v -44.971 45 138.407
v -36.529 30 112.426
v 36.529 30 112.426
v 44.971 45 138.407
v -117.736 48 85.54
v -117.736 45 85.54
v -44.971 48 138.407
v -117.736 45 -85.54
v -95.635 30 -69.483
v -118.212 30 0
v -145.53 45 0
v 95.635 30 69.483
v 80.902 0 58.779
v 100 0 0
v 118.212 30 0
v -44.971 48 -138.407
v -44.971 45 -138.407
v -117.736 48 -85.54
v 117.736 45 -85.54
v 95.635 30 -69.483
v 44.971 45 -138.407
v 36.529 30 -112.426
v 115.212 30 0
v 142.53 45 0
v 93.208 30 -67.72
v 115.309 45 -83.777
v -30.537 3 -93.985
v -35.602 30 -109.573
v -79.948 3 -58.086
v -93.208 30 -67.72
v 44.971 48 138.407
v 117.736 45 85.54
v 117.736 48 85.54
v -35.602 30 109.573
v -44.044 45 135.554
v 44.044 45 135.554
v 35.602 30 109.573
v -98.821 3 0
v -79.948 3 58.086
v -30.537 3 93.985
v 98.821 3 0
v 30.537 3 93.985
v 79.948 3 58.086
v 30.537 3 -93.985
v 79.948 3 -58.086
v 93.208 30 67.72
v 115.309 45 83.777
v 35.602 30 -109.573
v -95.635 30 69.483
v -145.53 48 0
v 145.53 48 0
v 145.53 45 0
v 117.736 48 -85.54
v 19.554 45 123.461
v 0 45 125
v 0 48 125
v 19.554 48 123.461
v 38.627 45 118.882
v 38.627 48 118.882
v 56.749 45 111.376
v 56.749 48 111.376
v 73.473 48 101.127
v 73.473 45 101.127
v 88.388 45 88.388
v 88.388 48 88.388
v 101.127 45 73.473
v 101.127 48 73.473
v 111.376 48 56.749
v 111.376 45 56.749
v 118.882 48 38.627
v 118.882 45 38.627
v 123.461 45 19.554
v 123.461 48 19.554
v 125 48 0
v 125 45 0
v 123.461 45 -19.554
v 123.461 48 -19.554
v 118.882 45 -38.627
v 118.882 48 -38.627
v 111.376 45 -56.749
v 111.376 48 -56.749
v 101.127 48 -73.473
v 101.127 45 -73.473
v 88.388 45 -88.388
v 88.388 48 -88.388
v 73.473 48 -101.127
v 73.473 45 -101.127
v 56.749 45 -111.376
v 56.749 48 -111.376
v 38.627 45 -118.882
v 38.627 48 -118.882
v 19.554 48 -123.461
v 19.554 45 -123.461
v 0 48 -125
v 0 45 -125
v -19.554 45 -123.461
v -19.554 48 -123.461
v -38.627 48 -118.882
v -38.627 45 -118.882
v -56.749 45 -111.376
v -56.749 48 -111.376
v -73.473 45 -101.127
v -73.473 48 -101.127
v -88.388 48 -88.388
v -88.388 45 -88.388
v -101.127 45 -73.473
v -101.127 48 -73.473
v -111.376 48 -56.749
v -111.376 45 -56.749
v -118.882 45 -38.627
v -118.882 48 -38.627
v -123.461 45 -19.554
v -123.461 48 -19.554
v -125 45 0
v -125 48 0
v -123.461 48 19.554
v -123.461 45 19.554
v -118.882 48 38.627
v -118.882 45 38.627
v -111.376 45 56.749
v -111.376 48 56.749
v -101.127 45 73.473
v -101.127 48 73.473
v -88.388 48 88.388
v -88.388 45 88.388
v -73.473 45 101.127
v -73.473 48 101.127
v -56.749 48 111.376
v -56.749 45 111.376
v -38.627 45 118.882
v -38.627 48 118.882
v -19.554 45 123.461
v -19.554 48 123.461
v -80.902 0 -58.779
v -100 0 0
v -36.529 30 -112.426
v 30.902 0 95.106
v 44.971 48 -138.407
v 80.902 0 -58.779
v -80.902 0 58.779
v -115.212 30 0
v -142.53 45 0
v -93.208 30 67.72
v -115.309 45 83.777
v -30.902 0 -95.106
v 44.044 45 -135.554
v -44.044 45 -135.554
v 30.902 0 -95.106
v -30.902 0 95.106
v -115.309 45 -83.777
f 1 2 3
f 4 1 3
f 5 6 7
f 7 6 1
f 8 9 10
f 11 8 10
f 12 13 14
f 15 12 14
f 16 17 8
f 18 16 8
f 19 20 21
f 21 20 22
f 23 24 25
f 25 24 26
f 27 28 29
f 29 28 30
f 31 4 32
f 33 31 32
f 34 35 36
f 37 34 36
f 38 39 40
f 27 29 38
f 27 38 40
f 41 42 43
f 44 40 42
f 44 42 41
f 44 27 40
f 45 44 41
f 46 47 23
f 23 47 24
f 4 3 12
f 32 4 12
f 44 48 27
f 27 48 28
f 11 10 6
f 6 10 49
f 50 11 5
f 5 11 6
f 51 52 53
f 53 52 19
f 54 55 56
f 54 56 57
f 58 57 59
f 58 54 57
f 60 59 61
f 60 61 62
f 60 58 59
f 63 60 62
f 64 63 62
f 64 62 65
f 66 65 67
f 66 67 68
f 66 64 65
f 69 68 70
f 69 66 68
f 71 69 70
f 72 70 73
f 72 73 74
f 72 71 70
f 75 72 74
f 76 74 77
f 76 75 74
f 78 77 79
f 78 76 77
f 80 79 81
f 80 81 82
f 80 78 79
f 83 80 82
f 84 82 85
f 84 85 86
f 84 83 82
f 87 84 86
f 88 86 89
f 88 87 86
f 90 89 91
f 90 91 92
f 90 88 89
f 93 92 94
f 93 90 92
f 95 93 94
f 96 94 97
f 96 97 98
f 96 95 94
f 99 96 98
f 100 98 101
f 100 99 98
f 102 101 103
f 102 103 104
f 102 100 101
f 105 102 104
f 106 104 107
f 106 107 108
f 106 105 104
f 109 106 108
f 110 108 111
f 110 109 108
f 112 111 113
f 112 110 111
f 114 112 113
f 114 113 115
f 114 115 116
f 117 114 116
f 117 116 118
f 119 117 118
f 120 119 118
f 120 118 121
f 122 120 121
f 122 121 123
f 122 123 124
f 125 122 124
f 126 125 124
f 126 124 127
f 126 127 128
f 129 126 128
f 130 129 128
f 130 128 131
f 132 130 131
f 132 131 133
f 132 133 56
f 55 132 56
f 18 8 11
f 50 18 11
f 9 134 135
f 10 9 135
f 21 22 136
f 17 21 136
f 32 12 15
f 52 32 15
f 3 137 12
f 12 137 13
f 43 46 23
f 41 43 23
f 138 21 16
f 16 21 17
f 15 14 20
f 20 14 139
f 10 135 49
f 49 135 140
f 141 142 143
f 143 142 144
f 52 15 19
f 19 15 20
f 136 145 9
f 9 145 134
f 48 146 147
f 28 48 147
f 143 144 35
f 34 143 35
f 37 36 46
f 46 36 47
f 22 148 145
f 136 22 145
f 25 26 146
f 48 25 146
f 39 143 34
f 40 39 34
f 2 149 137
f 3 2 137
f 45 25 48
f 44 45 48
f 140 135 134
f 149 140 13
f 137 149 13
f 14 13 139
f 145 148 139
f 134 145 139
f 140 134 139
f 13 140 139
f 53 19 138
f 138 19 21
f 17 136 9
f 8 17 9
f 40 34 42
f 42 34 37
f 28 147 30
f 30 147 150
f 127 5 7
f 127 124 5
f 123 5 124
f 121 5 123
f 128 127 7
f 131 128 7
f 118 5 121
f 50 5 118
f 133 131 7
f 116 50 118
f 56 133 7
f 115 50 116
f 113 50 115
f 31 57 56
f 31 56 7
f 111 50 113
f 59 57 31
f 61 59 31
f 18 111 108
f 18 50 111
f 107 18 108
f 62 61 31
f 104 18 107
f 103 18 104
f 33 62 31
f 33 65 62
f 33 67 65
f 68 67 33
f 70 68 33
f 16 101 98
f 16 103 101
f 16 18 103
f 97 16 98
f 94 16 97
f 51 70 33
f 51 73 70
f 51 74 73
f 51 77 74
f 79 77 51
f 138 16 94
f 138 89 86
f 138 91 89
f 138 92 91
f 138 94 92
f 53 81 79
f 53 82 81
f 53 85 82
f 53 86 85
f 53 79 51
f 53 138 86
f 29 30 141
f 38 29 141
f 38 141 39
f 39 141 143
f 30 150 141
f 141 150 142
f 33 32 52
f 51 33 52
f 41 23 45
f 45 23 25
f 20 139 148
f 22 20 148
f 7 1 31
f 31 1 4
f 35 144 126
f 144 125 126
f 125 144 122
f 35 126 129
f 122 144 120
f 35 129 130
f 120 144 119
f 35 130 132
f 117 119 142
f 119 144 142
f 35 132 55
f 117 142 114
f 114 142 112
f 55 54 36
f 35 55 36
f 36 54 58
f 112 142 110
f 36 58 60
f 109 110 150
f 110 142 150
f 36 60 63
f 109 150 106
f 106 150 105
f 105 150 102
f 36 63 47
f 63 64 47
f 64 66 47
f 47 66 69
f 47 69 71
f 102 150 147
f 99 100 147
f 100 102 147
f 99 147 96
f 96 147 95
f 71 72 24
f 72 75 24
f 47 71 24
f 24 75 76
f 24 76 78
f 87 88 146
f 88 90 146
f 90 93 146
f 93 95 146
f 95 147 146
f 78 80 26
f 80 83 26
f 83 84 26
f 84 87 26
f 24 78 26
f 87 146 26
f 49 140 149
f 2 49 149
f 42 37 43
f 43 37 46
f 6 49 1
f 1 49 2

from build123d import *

# Parameters (mm, degrees)
STAGE1EX_DEPTH      = 30
STAGE1EX_DRAFT      = -30
STAGE1IN_DEPTH      = 27
STAGE1IN_DRAFT      = -30
STAGE2EX_DEPTH      = 15
STAGE2EX_DRAFT      = -60
STAGE2IN_DEPTH      = 20
STAGE2IN_DRAFT      = -60
SKETCH11_R          = 125
BOSS_EXTRUDE6_DEPTH = 3


with BuildPart() as part:
    # Sketch4 → Stage1Ex (with draft: the straight prism first)
    with BuildSketch(Plane(origin=(0, 0, 0), x_dir=(1, 0, 0), z_dir=(0, 1, 0))):
        Polygon((30.901699437, -95.10565163), (80.901699437, -58.778525229), (100, 0), (80.901699437, 58.778525229), (30.901699437, 95.10565163), (-30.901699437, 95.10565163), (-80.901699437, 58.778525229), (-100, 0), (-80.901699437, -58.778525229), (-30.901699437, -95.10565163), align=None)
    extrude(amount=STAGE1EX_DEPTH)
    # Stage1Ex: the draft: its side faces are tilted about the plane it starts from
    stage1ex_sides = [part.faces().sort_by_distance(p)[0] for p in [
        (55.901699437, 15, 76.942088429),
        (90.450849719, 15, 29.389262615),
        (90.450849719, 15, -29.389262615),
        (55.901699437, 15, -76.942088429),
        (0, 15, -95.10565163),
        (-55.901699437, 15, -76.942088429),
        (-90.450849719, 15, -29.389262615),
        (-90.450849719, 15, 29.389262615),
        (-55.901699437, 15, 76.942088429),
        (0, 15, 95.10565163),
    ]]
    draft(stage1ex_sides, Plane(origin=(0, 0, 0), x_dir=(1, 0, 0), z_dir=(0, 1, 0)), STAGE1EX_DRAFT)


with BuildPart() as stage1in_tool:
    # Sketch7 → Stage1In (with draft: the straight prism first)
    with BuildSketch(Plane(origin=(0, 30, 0), x_dir=(1, 0, 0), z_dir=(0, 1, 0))):
        Polygon((-115.211859946, 0), (-93.20835265, -67.719832166), (-35.602422677, -109.572990156), (35.602422677, -109.572990156), (93.20835265, -67.719832166), (115.211859946, 0), (93.20835265, 67.719832166), (35.602422677, 109.572990156), (-35.602422677, 109.572990156), (-93.20835265, 67.719832166), align=None)
    extrude(amount=-STAGE1IN_DEPTH)
    # Stage1In: the draft: its side faces are tilted about the plane it starts from
    stage1in_sides = [stage1in_tool.faces().sort_by_distance(p)[0] for p in [
        (-104.210106298, 16.5, 33.859916083),
        (-64.405387663, 16.5, 88.646411161),
        (0, 16.5, 109.572990156),
        (64.405387663, 16.5, 88.646411161),
        (104.210106298, 16.5, 33.859916083),
        (104.210106298, 16.5, -33.859916083),
        (64.405387663, 16.5, -88.646411161),
        (0, 16.5, -109.572990156),
        (-64.405387663, 16.5, -88.646411161),
        (-104.210106298, 16.5, -33.859916083),
    ]]
    draft(stage1in_sides, Plane(origin=(0, 30, 0), x_dir=(1, 0, 0), z_dir=(0, 1, 0)), STAGE1IN_DRAFT)


with BuildPart() as part_1:
    add(part.part)

    # Stage1In: cut by stage1in_tool
    add(stage1in_tool.part, mode=Mode.SUBTRACT)


with BuildPart() as stage2ex_tool:
    # Sketch8 → Stage2Ex (with draft: the straight prism first)
    with BuildSketch(Plane(origin=(0, 30, 0), x_dir=(1, 0, 0), z_dir=(0, 1, 0))):
        Polygon((36.52947366, 112.426159705), (-36.52947366, 112.426159705), (-95.635403633, 69.483187922), (-118.211859946, 0), (-95.635403633, -69.483187922), (-36.52947366, -112.426159705), (36.52947366, -112.426159705), (95.635403633, -69.483187922), (118.211859946, 0), (95.635403633, 69.483187922), align=None)
    extrude(amount=STAGE2EX_DEPTH)
    # Stage2Ex: the draft: its side faces are tilted about the plane it starts from
    stage2ex_sides = [stage2ex_tool.faces().sort_by_distance(p)[0] for p in [
        (0, 37.5, -112.426159705),
        (-66.082438647, 37.5, -90.954673814),
        (-106.92363179, 37.5, -34.741593961),
        (-106.92363179, 37.5, 34.741593961),
        (-66.082438647, 37.5, 90.954673814),
        (0, 37.5, 112.426159705),
        (66.082438647, 37.5, 90.954673814),
        (106.92363179, 37.5, 34.741593961),
        (106.92363179, 37.5, -34.741593961),
        (66.082438647, 37.5, -90.954673814),
    ]]
    draft(stage2ex_sides, Plane(origin=(0, 30, 0), x_dir=(1, 0, 0), z_dir=(0, 1, 0)), STAGE2EX_DRAFT)


with BuildPart() as part_2:
    add(part_1.part)

    # Stage2Ex: add stage2ex_tool
    add(stage2ex_tool.part)


with BuildPart() as stage2in_tool:
    # Sketch10 → Stage2In (with draft: the straight prism first)
    with BuildSketch(Plane(origin=(0, 45, 0), x_dir=(1, 0, 0), z_dir=(0, 1, 0))):
        Polygon((115.308908944, -83.776826205), (142.529649866, 0), (115.308908944, 83.776826205), (44.044084011, 135.55375227), (-44.044084011, 135.55375227), (-115.308908944, 83.776826205), (-142.529649866, 0), (-115.308908944, -83.776826205), (-44.044084011, -135.55375227), (44.044084011, -135.55375227), align=None)
    extrude(amount=-STAGE2IN_DEPTH)
    # Stage2In: the draft: its side faces are tilted about the plane it starts from
    stage2in_sides = [stage2in_tool.faces().sort_by_distance(p)[0] for p in [
        (128.919279405, 35, 41.888413103),
        (128.919279405, 35, -41.888413103),
        (79.676496477, 35, -109.665289238),
        (0, 35, -135.55375227),
        (-79.676496477, 35, -109.665289238),
        (-128.919279405, 35, -41.888413103),
        (-128.919279405, 35, 41.888413103),
        (-79.676496477, 35, 109.665289238),
        (0, 35, 135.55375227),
        (79.676496477, 35, 109.665289238),
    ]]
    draft(stage2in_sides, Plane(origin=(0, 45, 0), x_dir=(1, 0, 0), z_dir=(0, 1, 0)), STAGE2IN_DRAFT)


with BuildPart() as part_3:
    add(part_2.part)

    # Stage2In: cut by stage2in_tool
    add(stage2in_tool.part, mode=Mode.SUBTRACT)

    # Sketch11 → Boss-Extrude6 (add)
    with BuildSketch(Plane(origin=(0, 45, 0), x_dir=(1, 0, 0), z_dir=(0, 1, 0))):
        Polygon((117.735959927, -85.540181962), (145.529649866, 0), (117.735959927, 85.540181962), (44.971134994, 138.406921819), (-44.971134994, 138.406921819), (-117.735959927, 85.540181962), (-145.529649866, 0), (-117.735959927, -85.540181962), (-44.971134994, -138.406921819), (44.971134994, -138.406921819), align=None)
        with Locations(Location((0, 0, 0), (0, 0, 270))):
            Circle(SKETCH11_R, mode=Mode.SUBTRACT)
    extrude(amount=BOSS_EXTRUDE6_DEPTH)


solid = part_3.part
